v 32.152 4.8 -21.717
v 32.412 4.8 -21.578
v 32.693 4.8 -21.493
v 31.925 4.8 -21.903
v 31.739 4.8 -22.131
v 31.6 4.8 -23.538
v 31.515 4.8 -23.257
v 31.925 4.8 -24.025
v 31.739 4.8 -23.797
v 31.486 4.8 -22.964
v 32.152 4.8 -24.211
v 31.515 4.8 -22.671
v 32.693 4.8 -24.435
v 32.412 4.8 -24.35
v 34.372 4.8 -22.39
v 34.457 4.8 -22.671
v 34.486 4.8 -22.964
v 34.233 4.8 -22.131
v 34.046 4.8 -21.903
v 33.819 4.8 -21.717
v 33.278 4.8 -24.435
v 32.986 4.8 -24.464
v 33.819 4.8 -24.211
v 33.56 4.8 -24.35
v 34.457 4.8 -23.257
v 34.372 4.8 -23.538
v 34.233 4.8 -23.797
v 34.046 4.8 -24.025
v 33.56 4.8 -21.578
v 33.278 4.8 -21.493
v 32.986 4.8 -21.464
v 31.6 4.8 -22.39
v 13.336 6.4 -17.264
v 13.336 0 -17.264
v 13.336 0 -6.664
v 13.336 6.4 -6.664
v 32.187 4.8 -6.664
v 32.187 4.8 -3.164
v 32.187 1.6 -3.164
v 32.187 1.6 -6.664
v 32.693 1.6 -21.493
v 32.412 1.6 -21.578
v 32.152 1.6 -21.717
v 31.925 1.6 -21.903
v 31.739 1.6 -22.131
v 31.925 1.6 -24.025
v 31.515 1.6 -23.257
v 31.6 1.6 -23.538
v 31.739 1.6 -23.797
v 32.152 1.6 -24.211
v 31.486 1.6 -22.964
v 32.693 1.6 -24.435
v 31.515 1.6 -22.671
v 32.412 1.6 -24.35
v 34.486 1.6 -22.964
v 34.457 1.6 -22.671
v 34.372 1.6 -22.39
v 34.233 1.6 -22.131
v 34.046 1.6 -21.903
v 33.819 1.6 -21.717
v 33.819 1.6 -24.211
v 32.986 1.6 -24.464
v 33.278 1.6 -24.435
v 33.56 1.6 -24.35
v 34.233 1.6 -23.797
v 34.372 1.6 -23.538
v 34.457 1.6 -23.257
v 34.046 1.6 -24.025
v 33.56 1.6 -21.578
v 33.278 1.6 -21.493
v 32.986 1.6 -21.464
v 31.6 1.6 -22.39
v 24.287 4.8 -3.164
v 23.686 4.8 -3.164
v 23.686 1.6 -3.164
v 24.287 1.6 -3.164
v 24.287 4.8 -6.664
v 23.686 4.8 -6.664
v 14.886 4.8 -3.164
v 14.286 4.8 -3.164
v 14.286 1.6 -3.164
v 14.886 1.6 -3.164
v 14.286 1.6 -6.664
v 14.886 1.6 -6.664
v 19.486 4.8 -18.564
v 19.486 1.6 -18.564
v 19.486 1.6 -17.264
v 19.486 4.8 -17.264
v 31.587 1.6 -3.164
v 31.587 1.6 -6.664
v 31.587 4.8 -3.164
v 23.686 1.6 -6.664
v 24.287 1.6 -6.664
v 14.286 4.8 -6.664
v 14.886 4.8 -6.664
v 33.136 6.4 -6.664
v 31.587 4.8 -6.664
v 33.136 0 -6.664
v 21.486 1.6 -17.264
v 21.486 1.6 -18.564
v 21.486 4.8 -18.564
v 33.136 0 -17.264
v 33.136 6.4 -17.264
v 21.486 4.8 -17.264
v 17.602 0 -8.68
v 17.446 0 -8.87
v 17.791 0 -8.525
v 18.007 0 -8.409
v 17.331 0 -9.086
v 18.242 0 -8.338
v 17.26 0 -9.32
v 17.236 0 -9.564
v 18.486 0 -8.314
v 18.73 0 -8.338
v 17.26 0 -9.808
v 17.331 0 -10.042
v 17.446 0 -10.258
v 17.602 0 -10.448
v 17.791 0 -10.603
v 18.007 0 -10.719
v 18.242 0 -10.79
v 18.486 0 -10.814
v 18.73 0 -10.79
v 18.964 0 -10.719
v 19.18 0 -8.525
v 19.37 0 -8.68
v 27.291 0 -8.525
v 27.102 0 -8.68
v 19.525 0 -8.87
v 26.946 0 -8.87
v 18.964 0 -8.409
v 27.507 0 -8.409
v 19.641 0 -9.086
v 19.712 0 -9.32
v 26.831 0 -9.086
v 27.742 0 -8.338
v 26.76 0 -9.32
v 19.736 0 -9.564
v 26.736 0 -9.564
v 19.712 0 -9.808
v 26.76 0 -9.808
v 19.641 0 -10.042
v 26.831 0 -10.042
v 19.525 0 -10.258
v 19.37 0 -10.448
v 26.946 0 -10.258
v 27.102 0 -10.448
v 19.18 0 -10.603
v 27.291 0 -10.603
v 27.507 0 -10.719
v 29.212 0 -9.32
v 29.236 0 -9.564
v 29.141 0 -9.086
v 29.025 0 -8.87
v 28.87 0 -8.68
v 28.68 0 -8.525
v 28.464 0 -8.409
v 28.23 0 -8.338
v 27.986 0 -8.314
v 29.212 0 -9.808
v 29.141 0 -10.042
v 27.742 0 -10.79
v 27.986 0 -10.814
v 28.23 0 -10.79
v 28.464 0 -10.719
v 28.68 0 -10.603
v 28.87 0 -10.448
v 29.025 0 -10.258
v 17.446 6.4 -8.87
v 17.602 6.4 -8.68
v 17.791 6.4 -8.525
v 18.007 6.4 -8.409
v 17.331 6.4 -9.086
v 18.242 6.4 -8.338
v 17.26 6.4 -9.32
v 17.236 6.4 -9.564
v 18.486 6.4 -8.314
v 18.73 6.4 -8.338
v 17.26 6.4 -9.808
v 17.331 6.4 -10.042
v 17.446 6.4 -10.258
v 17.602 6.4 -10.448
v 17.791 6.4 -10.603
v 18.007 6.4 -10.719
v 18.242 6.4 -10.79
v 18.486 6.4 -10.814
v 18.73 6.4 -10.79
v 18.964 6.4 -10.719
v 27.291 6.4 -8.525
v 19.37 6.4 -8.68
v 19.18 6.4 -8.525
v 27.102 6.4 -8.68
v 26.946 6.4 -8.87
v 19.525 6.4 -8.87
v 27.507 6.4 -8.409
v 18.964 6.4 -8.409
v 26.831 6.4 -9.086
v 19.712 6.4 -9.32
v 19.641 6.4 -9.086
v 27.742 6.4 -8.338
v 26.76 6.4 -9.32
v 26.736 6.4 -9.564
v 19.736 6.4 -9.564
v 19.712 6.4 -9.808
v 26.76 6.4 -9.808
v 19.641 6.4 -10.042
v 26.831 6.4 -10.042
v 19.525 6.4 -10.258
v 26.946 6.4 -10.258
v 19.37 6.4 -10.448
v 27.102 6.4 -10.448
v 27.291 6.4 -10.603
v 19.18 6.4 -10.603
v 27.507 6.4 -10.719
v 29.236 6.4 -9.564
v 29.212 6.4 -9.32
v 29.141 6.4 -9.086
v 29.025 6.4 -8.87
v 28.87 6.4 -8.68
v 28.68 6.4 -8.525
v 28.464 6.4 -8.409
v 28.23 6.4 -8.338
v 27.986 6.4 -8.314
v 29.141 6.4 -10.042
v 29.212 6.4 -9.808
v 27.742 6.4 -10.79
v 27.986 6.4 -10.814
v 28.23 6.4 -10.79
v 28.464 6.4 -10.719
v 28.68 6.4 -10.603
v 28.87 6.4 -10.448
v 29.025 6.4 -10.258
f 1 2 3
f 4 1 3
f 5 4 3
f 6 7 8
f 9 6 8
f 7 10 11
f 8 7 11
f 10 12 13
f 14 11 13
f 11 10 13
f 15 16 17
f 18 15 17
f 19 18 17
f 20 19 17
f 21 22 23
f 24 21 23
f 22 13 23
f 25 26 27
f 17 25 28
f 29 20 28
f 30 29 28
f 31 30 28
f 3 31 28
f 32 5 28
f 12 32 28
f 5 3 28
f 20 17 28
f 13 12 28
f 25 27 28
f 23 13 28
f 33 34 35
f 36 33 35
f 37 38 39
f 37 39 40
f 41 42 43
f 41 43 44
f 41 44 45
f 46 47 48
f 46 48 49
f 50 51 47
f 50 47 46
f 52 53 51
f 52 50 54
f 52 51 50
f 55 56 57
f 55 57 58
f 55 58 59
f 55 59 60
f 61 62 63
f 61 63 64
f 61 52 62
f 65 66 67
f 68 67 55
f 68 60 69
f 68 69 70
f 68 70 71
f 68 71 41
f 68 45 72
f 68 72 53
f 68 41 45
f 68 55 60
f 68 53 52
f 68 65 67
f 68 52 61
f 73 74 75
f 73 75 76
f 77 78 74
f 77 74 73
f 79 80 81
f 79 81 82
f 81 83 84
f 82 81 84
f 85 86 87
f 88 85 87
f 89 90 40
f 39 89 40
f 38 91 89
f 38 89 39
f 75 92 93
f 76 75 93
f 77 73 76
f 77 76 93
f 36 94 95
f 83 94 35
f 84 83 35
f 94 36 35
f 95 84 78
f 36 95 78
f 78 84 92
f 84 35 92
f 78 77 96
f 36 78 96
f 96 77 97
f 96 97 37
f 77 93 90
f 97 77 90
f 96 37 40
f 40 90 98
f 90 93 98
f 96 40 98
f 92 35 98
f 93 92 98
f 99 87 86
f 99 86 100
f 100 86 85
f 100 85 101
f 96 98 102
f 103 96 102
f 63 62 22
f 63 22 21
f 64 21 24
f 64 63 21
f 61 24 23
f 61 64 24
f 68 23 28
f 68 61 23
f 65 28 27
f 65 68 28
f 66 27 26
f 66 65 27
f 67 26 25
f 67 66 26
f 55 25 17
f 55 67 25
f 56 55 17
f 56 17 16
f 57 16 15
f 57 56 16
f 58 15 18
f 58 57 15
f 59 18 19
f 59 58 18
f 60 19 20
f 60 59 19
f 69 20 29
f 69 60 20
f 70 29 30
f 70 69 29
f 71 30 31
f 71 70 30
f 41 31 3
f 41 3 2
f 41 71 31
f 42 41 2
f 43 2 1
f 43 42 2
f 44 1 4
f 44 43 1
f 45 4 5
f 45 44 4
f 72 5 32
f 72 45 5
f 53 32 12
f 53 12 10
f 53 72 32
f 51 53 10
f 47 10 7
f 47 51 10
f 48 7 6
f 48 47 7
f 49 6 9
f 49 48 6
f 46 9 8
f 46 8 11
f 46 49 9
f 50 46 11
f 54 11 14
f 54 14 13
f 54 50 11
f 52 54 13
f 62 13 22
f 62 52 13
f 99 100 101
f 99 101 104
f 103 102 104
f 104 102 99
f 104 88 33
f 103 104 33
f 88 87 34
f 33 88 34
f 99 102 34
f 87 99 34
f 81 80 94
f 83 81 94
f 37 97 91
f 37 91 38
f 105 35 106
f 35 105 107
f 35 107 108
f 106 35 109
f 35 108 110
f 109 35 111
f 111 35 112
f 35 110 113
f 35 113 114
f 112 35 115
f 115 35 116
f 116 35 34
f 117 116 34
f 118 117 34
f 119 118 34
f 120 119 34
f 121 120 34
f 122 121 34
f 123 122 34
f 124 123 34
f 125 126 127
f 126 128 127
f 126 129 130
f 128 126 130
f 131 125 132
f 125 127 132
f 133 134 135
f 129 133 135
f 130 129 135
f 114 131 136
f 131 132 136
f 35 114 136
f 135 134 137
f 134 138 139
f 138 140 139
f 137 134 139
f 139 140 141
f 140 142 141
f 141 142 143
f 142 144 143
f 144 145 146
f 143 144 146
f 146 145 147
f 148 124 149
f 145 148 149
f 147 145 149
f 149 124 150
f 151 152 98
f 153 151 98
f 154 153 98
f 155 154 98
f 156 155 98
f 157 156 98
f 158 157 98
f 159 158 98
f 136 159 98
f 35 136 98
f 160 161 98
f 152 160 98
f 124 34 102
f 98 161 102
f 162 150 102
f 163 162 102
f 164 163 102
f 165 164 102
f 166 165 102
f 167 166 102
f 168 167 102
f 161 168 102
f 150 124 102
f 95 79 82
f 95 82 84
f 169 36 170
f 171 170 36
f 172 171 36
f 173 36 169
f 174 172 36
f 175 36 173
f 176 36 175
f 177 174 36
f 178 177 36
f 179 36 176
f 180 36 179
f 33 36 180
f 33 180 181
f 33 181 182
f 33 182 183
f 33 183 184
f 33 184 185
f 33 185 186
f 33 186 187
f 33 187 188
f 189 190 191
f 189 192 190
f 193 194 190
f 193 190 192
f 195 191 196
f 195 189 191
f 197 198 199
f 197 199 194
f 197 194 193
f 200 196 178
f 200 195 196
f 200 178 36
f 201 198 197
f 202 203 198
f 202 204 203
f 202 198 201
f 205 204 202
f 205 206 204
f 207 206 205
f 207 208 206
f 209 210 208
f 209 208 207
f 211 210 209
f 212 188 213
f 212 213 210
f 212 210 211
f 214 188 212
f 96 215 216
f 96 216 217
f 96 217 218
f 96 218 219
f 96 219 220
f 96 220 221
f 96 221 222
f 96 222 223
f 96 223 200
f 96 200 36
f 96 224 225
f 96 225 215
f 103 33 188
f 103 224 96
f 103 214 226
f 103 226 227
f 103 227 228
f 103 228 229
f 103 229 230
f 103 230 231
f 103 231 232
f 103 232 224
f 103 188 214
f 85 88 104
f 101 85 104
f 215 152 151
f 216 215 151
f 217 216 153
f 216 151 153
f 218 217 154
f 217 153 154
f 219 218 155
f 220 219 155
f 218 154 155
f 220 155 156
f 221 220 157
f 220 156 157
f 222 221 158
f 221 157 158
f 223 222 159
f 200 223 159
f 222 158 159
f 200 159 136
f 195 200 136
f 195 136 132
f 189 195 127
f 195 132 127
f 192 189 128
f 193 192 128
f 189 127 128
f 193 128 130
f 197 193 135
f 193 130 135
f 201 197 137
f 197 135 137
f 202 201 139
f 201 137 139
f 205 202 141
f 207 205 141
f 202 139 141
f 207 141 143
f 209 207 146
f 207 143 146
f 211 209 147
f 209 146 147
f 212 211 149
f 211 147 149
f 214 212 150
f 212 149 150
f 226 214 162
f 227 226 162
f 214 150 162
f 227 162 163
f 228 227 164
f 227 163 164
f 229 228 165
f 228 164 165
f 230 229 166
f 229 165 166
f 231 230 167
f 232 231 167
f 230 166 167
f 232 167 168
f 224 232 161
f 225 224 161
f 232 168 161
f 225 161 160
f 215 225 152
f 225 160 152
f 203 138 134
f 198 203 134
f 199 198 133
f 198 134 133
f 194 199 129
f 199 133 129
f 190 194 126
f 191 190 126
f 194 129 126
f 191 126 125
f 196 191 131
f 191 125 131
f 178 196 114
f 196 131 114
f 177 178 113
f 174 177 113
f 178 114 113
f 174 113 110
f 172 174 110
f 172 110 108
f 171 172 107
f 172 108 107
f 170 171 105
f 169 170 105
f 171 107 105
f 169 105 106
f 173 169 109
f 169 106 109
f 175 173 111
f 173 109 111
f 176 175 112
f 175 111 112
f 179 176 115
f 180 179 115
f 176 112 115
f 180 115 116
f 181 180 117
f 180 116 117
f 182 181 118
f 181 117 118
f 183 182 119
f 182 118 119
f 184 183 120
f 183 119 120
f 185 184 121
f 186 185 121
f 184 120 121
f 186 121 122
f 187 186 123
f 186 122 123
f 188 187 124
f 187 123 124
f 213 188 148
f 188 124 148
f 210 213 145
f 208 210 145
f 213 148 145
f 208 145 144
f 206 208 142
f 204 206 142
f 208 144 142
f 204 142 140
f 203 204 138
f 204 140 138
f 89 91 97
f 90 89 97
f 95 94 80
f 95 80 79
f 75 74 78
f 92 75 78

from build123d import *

# Parameters (mm, degrees)
BOSS_EXTRUDE1_DEPTH = 6.4
BOSS_EXTRUDE2_START = -1.6
SKETCH3_W           = 0.6
SKETCH3_H           = 3.5
SKETCH3_W_2         = 0.601181881
BOSS_EXTRUDE2_DEPTH = 3.2
BOSS_EXTRUDE4_START = -1.6
SKETCH4_R           = 1.5
SKETCH4_W           = 2
SKETCH4_H           = 1.3
BOSS_EXTRUDE4_DEPTH = 3.2


with BuildPart() as part:
    # Sketch1 → Boss-Extrude1 (new body)
    with BuildSketch(Plane(origin=(0, 0, 0), x_dir=(1, 0, 0), z_dir=(0, 1, 0))):
        with BuildLine():
            Line((33.135731415, 9.563994519), (29.235731415, 9.563994519))
            ThreePointArc((29.235731415, 9.563994519), (27.985731415, 8.313994519), (26.735731415, 9.563994519))
            Line((26.735731415, 9.563994519), (19.735731415, 9.563994519))
            ThreePointArc((19.735731415, 9.563994519), (18.485731415, 8.313994519), (17.235731415, 9.563994519))
            Line((17.235731415, 9.563994519), (13.335731415, 9.563994519))
            Line((13.335731415, 9.563994519), (13.335731415, 6.663994519))
            Line((13.335731415, 6.663994519), (33.135731415, 6.663994519))
            Line((33.135731415, 6.663994519), (33.135731415, 9.563994519))
        make_face()
        with BuildLine():
            ThreePointArc((26.735731415, 9.563994519), (27.985731415, 10.813994519), (29.235731415, 9.563994519))
            Line((29.235731415, 9.563994519), (33.135731415, 9.563994519))
            Line((33.135731415, 9.563994519), (33.135731415, 17.263994519))
            Line((33.135731415, 17.263994519), (21.485731415, 17.263994519))
            Line((21.485731415, 17.263994519), (19.485731415, 17.263994519))
            Line((19.485731415, 17.263994519), (13.335731415, 17.263994519))
            Line((13.335731415, 17.263994519), (13.335731415, 9.563994519))
            Line((13.335731415, 9.563994519), (17.235731415, 9.563994519))
            ThreePointArc((17.235731415, 9.563994519), (18.485731415, 10.813994519), (19.735731415, 9.563994519))
            Line((19.735731415, 9.563994519), (26.735731415, 9.563994519))
        make_face()
    extrude(amount=BOSS_EXTRUDE1_DEPTH)

    # Sketch3 → Boss-Extrude2 (add)
    with BuildSketch(Plane(origin=(0, 6.4, 0), x_dir=(1, 0, 0), z_dir=(0, 1, 0)).offset(BOSS_EXTRUDE2_START)):
        with Locations((14.585731415, 4.913994519)):
            Rectangle(SKETCH3_W, SKETCH3_H)
        with Locations((23.986322356, 4.913994519)):
            Rectangle(SKETCH3_W_2, SKETCH3_H)
        with Locations((31.886913296, 4.913994519)):
            Rectangle(SKETCH3_W, SKETCH3_H)
    extrude(amount=-BOSS_EXTRUDE2_DEPTH)

    # Sketch4 → Boss-Extrude4 (add)
    with BuildSketch(Plane.XZ.offset(BOSS_EXTRUDE4_START)):
        with Locations(Location((32.985731415, -22.963994519, 0), (0, 0, 270))):
            Circle(SKETCH4_R)
        with Locations((20.485731415, -17.913994519)):
            Rectangle(SKETCH4_W, SKETCH4_H)
    extrude(amount=-BOSS_EXTRUDE4_DEPTH)


with BuildPart() as boss_extrude4_piece_1:
    # of the separate pieces the step leaves, piece 1, a body of its own (boss_extrude4_pieces)
    add(part.part.solids().sort_by_distance((29.235731415, 6.4, -9.563994519))[0])


with BuildPart() as boss_extrude4_piece_2:
    # of the separate pieces the step leaves, piece 2, a body of its own (boss_extrude4_pieces)
    add(part.part.solids().sort_by_distance((32.985731415, 1.6, -24.463994519))[0])


solid = Compound([boss_extrude4_piece_1.part, boss_extrude4_piece_2.part])
